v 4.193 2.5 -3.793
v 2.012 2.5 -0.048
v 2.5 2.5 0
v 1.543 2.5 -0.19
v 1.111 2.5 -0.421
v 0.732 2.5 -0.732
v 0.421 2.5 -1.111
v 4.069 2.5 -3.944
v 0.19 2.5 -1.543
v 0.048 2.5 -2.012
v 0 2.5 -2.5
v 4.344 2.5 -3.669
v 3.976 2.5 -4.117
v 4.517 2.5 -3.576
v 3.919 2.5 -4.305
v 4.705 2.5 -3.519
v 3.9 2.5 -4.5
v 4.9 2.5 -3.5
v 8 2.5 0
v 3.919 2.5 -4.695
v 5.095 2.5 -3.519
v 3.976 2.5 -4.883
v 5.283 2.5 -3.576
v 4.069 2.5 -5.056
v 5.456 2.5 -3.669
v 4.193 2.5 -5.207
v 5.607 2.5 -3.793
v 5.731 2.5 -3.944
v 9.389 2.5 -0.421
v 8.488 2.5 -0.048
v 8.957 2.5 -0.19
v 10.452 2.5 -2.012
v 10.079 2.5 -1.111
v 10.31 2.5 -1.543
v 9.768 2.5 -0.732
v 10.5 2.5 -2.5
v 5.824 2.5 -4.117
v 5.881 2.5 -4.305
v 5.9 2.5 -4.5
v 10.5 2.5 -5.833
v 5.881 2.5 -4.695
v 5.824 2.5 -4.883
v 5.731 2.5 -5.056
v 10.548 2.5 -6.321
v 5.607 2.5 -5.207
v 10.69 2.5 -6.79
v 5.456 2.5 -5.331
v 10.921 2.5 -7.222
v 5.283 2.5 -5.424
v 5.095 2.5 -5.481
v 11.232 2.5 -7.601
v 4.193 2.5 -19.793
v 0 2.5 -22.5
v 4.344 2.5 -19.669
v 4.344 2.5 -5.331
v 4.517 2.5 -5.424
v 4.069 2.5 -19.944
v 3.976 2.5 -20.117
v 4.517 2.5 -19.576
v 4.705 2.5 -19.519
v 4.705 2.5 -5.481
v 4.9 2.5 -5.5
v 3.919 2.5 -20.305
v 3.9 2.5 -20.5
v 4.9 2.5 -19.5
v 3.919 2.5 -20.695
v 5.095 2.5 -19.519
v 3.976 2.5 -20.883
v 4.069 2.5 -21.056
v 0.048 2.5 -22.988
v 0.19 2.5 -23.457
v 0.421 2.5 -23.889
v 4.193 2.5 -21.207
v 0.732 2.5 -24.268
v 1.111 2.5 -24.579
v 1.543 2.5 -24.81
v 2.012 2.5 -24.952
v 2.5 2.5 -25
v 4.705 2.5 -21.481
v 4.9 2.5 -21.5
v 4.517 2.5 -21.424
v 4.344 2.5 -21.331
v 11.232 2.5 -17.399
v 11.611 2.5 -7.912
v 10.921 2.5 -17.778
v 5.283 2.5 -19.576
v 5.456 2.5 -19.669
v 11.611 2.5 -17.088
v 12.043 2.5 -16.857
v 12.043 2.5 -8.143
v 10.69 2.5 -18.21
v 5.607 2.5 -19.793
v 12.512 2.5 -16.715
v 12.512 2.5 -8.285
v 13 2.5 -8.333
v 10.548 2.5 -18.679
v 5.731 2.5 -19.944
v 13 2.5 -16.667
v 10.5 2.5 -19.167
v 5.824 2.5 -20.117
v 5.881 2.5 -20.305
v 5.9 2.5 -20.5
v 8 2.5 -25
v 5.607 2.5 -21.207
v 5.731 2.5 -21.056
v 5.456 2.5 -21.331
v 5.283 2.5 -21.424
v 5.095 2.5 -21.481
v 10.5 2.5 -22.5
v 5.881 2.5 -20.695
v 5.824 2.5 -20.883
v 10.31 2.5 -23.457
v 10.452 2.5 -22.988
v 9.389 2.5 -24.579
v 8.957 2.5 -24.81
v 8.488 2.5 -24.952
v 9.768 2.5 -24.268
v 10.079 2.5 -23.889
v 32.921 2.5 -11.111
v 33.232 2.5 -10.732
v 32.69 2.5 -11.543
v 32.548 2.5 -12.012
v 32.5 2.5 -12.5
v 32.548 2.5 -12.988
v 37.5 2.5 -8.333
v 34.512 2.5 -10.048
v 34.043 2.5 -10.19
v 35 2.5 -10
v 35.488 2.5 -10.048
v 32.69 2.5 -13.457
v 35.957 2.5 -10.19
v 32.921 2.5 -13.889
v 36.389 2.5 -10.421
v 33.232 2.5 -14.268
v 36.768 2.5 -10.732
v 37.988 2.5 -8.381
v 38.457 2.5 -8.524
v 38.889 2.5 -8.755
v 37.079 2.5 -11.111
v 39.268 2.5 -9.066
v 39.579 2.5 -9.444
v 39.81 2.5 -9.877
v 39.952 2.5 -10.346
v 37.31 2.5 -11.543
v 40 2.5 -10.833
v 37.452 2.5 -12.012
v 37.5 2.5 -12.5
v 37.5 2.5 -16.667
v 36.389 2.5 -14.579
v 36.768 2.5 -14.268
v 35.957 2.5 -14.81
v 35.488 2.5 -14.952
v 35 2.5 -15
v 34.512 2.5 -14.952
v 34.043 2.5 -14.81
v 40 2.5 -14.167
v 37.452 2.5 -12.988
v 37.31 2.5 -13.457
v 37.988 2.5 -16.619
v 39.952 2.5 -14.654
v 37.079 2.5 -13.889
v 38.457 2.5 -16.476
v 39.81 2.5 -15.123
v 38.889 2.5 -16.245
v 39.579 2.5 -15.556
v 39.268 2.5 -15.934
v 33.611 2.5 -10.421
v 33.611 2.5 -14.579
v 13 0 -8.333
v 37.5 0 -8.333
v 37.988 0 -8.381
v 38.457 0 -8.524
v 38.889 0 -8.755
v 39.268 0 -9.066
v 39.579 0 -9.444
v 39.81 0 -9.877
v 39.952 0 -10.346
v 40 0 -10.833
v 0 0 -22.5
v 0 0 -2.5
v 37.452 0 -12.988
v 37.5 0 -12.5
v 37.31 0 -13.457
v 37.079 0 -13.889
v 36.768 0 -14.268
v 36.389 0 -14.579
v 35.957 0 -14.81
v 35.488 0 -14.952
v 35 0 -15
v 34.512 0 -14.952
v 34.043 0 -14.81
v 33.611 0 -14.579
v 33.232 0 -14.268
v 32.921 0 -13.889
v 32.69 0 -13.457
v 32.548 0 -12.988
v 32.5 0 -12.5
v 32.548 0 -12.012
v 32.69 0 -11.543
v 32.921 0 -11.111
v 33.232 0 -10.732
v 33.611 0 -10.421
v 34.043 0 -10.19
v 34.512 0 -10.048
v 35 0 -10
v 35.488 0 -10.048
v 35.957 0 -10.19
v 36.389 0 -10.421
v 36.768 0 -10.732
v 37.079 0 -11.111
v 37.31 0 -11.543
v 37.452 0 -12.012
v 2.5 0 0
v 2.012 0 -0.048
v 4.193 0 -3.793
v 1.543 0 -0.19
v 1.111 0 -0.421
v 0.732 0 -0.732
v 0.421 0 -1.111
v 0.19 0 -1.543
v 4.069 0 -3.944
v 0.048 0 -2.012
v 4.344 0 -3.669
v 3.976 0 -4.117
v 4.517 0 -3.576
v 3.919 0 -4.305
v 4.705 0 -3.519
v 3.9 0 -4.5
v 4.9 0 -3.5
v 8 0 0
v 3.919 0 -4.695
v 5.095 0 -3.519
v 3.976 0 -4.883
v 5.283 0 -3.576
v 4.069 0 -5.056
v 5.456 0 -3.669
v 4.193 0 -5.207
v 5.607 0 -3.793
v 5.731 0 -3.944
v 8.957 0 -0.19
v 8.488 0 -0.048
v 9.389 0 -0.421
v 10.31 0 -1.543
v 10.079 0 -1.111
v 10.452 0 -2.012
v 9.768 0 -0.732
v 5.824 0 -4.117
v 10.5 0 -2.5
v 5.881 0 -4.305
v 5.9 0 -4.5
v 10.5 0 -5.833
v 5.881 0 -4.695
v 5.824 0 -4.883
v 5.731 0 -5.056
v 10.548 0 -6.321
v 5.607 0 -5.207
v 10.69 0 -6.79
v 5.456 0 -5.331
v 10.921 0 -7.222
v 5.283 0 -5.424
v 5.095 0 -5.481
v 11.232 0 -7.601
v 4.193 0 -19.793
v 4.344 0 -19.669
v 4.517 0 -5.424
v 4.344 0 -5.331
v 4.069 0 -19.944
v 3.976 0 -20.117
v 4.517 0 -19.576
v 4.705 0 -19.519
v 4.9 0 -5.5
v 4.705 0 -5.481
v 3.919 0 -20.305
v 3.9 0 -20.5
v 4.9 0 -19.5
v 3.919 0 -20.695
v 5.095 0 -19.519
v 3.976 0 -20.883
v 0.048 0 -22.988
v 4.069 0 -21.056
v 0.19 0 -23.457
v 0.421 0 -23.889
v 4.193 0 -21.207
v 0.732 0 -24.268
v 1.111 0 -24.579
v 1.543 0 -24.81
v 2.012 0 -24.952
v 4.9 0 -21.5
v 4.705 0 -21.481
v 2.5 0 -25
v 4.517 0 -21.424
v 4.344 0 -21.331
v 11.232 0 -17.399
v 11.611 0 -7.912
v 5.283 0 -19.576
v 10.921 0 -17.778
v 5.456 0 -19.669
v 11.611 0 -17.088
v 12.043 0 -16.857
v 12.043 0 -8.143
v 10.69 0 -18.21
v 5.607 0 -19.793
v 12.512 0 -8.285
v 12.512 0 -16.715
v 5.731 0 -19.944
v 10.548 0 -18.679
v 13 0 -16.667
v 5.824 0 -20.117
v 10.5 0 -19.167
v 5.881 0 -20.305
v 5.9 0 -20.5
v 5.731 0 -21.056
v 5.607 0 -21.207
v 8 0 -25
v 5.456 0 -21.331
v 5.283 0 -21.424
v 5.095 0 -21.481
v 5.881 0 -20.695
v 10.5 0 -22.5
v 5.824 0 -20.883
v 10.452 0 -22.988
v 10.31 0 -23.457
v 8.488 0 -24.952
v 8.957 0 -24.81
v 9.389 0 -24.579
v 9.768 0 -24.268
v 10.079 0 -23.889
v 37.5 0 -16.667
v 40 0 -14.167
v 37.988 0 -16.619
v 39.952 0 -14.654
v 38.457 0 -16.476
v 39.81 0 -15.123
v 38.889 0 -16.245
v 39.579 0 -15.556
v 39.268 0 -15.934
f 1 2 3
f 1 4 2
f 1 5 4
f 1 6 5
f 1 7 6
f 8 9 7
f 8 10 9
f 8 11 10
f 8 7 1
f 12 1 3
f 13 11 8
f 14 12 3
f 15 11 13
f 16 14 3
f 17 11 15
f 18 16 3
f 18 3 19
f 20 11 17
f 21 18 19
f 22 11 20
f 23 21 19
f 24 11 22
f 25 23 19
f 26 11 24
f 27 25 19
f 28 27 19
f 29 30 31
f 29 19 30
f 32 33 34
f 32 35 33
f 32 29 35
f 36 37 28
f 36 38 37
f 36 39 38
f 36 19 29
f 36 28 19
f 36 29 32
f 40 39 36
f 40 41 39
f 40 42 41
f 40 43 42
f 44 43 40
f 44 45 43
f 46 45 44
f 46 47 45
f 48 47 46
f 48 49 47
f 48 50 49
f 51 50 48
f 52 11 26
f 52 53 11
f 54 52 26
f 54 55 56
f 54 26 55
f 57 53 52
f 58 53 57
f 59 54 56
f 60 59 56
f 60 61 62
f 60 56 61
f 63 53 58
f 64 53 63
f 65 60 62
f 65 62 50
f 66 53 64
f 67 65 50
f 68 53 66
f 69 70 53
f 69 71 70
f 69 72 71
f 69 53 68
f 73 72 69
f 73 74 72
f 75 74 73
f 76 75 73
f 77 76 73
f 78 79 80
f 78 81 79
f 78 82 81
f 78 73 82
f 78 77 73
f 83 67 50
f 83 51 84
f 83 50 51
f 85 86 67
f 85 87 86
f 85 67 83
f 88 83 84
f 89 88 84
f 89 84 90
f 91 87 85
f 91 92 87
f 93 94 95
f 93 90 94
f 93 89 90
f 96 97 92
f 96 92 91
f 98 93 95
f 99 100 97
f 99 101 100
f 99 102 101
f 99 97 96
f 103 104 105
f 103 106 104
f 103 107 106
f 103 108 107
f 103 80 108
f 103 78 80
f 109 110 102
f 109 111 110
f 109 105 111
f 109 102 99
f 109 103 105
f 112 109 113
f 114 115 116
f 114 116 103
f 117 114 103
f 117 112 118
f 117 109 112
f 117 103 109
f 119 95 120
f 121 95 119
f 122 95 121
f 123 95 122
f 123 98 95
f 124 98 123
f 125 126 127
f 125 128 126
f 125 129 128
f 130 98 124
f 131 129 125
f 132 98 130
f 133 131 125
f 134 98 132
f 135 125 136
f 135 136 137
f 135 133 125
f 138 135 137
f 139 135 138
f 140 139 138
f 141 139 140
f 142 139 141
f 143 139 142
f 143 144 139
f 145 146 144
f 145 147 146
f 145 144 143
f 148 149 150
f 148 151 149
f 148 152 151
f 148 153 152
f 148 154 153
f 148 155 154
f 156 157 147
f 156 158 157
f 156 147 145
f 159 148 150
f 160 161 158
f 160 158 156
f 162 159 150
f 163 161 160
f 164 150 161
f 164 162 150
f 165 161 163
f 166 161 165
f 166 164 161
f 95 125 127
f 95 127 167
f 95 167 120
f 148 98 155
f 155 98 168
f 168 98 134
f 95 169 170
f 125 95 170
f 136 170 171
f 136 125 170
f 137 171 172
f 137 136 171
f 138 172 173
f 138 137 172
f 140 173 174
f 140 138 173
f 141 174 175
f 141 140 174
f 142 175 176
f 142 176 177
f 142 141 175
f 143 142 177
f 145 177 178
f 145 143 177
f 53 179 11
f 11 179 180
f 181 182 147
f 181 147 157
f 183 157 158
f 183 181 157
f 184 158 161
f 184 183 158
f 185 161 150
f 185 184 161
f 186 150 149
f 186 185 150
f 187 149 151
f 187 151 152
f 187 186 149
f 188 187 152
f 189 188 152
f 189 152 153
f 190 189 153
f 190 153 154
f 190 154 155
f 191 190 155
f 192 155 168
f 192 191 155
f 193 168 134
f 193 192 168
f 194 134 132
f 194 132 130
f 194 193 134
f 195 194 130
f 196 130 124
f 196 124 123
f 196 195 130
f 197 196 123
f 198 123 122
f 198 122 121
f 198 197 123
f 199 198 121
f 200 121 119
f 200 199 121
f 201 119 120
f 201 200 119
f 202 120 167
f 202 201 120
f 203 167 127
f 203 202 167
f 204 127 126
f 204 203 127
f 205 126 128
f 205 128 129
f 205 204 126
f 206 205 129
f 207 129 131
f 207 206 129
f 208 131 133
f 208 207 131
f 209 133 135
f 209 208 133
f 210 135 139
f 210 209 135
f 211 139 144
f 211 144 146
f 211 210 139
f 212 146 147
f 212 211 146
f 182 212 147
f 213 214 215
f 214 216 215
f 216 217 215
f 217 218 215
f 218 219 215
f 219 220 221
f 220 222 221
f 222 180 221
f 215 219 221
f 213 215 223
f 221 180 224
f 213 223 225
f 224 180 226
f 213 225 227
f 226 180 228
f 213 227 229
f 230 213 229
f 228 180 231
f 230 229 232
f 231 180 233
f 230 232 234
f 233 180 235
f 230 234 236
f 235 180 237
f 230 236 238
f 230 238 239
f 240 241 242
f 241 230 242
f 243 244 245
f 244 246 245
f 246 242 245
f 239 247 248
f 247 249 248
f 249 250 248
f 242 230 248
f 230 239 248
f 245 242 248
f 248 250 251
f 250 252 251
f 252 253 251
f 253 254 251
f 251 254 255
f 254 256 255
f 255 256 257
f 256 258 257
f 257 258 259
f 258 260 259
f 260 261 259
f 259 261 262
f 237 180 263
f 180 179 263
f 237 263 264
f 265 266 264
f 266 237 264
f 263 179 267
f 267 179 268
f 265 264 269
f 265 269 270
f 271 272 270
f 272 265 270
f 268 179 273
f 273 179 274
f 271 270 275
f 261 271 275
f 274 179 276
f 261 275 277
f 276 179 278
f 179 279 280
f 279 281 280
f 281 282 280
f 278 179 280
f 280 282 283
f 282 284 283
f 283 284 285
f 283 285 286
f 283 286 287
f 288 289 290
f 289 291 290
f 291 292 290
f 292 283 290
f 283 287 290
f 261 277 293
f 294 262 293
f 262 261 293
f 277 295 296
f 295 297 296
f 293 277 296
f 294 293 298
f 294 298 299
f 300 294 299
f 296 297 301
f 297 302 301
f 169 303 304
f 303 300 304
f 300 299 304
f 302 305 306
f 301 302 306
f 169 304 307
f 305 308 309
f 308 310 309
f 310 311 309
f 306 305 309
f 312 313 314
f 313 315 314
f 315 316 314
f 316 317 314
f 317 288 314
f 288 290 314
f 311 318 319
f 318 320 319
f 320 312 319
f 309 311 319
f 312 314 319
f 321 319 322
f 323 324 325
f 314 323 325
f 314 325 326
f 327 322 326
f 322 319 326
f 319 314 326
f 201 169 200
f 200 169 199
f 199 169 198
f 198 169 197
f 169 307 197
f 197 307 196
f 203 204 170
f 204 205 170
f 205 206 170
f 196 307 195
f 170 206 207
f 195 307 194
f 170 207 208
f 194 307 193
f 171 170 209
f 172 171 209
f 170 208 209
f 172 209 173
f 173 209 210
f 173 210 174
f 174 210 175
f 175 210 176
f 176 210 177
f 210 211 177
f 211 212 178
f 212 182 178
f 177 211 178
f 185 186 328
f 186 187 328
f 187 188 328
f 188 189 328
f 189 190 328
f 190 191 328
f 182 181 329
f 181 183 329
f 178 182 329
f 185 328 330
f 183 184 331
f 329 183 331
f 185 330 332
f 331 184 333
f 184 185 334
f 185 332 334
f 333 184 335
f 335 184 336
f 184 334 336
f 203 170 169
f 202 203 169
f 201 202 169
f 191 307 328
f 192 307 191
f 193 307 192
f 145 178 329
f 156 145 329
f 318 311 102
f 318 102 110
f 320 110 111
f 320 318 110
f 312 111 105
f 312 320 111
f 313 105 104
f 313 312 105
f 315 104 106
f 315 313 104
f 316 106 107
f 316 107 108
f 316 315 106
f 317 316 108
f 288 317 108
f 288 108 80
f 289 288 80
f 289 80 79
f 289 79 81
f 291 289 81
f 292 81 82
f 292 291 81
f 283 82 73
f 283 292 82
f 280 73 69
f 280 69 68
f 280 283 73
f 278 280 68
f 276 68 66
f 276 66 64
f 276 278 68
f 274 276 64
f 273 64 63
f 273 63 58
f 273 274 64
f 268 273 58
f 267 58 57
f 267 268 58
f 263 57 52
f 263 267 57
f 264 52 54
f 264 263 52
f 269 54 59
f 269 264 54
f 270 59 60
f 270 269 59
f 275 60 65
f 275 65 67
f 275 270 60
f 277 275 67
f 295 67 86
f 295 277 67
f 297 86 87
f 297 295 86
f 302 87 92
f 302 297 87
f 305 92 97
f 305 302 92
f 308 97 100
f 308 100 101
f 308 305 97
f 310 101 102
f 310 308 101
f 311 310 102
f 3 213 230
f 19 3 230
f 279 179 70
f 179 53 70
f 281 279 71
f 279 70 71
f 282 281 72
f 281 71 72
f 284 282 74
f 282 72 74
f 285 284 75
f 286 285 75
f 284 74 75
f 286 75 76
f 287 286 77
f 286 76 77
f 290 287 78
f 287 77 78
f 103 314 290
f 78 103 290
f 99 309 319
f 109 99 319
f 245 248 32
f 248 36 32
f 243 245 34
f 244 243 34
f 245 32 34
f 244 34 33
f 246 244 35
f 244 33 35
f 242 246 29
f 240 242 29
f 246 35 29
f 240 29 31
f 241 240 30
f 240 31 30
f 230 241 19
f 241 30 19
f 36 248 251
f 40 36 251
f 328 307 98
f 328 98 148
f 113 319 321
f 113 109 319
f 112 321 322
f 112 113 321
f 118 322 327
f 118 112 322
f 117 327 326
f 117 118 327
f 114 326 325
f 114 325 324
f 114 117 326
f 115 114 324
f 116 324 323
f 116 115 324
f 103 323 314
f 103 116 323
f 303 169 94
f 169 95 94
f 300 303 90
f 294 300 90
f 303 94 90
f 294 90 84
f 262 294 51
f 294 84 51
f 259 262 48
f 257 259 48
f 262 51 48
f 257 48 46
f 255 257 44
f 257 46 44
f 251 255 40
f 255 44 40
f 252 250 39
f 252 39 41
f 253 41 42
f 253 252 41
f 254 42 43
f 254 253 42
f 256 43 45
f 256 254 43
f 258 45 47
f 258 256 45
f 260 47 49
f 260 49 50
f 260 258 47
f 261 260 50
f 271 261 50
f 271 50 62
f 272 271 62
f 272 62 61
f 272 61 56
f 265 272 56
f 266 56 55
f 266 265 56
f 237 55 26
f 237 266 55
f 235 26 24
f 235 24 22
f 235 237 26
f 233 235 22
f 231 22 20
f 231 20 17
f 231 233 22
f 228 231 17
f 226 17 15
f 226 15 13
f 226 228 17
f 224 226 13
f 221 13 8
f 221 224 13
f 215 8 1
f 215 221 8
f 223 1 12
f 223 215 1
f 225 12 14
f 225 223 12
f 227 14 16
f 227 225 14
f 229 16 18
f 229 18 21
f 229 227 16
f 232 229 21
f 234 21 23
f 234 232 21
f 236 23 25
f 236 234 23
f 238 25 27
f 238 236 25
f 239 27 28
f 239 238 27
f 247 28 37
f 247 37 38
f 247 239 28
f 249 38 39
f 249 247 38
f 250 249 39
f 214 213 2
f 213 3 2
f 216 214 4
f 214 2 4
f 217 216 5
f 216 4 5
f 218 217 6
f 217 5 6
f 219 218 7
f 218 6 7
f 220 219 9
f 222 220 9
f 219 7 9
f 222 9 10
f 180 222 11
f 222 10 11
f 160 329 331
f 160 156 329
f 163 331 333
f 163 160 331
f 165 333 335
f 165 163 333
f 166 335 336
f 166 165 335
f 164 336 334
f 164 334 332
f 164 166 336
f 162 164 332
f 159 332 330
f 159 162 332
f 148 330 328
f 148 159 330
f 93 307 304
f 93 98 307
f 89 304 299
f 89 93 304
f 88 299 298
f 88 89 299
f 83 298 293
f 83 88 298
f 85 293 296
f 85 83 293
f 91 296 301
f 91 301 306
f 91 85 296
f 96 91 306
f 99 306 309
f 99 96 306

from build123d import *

# Parameters (mm, degrees)
SKETCH1_W           = 29.5
SKETCH1_H           = 8.333333334
SKETCH1_R           = 2.5
SKETCH1_R_2         = 1
BOSS_EXTRUDE1_DEPTH = 2.5
FILLET1_R           = 2.5


with BuildPart() as part:
    # Sketch1 → Boss-Extrude1 (new body)
    with BuildSketch(Plane(origin=(0, 0, 0), x_dir=(1, 0, 0), z_dir=(0, 1, 0))):
        with Locations((25.25, 12.5)):
            Rectangle(SKETCH1_W, SKETCH1_H)
        with Locations((35, 12.5)):
            Circle(SKETCH1_R, mode=Mode.SUBTRACT)
        Polygon((10.5, 25), (1.052631579, 25), (0, 25), (0, 0), (10.5, 0), (10.5, 8.333333333), (10.5, 16.666666667), align=None)
        with Locations((4.9, 4.5)):
            Circle(SKETCH1_R_2, mode=Mode.SUBTRACT)
        with Locations((4.9, 20.5)):
            Circle(SKETCH1_R_2, mode=Mode.SUBTRACT)
    extrude(amount=BOSS_EXTRUDE1_DEPTH)

    # Fillet1
    fillet1_edges = [part.edges().sort_by_distance(p)[0] for p in [
        (40, 1.25, -8.333333333),
        (10.5, 1.25, -8.333333333),
        (10.5, 1.25, 0),
        (0, 1.25, 0),
        (0, 1.25, -25),
        (10.5, 1.25, -25),
        (10.5, 1.25, -16.666666667),
        (40, 1.25, -16.666666667),
    ]]
    fillet(fillet1_edges, radius=FILLET1_R)


solid = part.part
